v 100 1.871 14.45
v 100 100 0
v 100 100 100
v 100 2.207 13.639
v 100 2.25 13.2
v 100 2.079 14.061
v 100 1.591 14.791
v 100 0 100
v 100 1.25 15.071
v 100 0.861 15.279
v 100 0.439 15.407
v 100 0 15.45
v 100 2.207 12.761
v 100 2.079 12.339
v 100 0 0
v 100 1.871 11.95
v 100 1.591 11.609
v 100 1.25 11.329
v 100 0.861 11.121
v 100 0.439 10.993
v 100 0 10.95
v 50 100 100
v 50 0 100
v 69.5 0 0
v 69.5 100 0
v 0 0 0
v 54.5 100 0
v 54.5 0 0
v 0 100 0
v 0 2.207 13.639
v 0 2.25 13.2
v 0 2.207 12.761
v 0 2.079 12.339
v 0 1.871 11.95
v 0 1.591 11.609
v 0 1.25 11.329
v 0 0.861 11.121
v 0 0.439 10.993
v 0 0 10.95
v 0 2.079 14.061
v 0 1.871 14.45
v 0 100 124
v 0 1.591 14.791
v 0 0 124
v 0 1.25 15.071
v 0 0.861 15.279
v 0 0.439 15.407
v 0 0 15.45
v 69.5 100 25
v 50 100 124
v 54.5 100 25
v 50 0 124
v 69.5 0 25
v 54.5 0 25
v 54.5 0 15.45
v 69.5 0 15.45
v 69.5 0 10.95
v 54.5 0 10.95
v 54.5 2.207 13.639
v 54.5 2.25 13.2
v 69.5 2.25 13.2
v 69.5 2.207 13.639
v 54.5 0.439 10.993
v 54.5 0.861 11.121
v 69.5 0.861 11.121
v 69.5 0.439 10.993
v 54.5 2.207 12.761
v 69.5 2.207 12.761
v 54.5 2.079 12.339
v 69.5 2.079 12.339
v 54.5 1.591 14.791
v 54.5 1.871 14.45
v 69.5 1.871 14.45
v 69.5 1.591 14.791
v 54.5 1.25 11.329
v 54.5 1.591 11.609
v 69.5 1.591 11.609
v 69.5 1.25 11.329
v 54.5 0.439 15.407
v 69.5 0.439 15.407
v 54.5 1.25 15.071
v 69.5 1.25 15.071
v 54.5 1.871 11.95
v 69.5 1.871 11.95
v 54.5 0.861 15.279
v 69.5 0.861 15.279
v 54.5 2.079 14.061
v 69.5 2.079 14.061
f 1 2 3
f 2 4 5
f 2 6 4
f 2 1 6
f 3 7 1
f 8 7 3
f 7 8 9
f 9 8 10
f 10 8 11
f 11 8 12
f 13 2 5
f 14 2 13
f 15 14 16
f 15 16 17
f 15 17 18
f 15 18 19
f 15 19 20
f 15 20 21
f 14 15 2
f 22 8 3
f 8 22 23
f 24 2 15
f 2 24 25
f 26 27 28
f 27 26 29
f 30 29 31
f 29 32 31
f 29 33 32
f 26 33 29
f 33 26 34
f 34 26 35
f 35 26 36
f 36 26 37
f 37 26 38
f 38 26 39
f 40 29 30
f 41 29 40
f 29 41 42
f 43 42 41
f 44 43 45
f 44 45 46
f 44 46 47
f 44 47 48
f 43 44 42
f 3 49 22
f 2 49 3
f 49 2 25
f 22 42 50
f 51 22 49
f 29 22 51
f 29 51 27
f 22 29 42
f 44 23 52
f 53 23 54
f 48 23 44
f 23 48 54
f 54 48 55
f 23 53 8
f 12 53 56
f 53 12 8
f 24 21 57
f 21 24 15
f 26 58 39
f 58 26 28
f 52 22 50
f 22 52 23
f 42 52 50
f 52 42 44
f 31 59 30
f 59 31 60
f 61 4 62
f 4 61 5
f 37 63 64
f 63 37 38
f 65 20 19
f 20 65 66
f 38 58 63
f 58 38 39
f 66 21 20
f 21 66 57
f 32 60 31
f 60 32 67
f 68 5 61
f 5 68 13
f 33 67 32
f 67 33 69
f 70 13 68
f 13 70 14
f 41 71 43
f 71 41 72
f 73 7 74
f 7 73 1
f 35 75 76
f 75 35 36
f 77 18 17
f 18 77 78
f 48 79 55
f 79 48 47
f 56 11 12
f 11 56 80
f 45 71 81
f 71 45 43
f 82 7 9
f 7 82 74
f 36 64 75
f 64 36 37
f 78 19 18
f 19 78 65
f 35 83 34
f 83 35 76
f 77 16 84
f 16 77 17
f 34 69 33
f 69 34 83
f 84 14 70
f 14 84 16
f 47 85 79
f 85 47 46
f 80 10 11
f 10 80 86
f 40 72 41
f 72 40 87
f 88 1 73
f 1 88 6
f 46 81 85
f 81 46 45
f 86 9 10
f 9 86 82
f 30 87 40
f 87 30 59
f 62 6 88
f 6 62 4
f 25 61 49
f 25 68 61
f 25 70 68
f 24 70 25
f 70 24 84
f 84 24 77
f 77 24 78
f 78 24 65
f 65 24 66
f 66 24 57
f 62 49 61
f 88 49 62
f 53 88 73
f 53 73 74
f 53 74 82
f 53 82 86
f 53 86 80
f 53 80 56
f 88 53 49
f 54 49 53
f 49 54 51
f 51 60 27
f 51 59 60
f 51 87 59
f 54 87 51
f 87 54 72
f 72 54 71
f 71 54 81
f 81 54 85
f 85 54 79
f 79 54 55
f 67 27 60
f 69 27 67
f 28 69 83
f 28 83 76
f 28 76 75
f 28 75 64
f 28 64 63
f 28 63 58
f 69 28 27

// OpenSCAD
$fn = 32;
// ----------------------------------------------------------------------
// Freeform cube: 100 x 100 x 100
// ----------------------------------------------------------------------
// --- parameters (mm) ---
base_len = 100;           // base edge, X and Y
base_w = 100;             // base width, Y
base_h = 100;             // base height, Z
top_len = 50;             // top edge, X
top_w = 50;               // top width, Y
top_h = 25;               // top height, Z
hole_d = 4.5;             // clearance for M4
slot_w = 5;               // adjustment slot width
slot_l = 16;              // adjustment slot length
module base_box() {
  cube([base_len, base_w, base_h]);
}
module top_box() {
  translate([0, 0, base_h - 1]) cube([top_len, base_w, top_h]);
}
module adjustment_slot() {
  /* Slot through both base and top boxes, adjusted for the gap in the middle */
  translate([base_len / 2 - (slot_l / 2 - (top_len / 2 - slot_l / 2)) / 2, 0, -1])
    cube([slot_l - 1, base_w, top_h + 1]);
}
difference() {
  union() {
    base_box();
    top_box();
  }
  adjustment_slot();
  for (i = [0:5]) rotate([0, 90, 0]) translate([25.4 * i - 13.2, 0, -1]) cylinder(h = base_h + 2, d = hole_d);
}
